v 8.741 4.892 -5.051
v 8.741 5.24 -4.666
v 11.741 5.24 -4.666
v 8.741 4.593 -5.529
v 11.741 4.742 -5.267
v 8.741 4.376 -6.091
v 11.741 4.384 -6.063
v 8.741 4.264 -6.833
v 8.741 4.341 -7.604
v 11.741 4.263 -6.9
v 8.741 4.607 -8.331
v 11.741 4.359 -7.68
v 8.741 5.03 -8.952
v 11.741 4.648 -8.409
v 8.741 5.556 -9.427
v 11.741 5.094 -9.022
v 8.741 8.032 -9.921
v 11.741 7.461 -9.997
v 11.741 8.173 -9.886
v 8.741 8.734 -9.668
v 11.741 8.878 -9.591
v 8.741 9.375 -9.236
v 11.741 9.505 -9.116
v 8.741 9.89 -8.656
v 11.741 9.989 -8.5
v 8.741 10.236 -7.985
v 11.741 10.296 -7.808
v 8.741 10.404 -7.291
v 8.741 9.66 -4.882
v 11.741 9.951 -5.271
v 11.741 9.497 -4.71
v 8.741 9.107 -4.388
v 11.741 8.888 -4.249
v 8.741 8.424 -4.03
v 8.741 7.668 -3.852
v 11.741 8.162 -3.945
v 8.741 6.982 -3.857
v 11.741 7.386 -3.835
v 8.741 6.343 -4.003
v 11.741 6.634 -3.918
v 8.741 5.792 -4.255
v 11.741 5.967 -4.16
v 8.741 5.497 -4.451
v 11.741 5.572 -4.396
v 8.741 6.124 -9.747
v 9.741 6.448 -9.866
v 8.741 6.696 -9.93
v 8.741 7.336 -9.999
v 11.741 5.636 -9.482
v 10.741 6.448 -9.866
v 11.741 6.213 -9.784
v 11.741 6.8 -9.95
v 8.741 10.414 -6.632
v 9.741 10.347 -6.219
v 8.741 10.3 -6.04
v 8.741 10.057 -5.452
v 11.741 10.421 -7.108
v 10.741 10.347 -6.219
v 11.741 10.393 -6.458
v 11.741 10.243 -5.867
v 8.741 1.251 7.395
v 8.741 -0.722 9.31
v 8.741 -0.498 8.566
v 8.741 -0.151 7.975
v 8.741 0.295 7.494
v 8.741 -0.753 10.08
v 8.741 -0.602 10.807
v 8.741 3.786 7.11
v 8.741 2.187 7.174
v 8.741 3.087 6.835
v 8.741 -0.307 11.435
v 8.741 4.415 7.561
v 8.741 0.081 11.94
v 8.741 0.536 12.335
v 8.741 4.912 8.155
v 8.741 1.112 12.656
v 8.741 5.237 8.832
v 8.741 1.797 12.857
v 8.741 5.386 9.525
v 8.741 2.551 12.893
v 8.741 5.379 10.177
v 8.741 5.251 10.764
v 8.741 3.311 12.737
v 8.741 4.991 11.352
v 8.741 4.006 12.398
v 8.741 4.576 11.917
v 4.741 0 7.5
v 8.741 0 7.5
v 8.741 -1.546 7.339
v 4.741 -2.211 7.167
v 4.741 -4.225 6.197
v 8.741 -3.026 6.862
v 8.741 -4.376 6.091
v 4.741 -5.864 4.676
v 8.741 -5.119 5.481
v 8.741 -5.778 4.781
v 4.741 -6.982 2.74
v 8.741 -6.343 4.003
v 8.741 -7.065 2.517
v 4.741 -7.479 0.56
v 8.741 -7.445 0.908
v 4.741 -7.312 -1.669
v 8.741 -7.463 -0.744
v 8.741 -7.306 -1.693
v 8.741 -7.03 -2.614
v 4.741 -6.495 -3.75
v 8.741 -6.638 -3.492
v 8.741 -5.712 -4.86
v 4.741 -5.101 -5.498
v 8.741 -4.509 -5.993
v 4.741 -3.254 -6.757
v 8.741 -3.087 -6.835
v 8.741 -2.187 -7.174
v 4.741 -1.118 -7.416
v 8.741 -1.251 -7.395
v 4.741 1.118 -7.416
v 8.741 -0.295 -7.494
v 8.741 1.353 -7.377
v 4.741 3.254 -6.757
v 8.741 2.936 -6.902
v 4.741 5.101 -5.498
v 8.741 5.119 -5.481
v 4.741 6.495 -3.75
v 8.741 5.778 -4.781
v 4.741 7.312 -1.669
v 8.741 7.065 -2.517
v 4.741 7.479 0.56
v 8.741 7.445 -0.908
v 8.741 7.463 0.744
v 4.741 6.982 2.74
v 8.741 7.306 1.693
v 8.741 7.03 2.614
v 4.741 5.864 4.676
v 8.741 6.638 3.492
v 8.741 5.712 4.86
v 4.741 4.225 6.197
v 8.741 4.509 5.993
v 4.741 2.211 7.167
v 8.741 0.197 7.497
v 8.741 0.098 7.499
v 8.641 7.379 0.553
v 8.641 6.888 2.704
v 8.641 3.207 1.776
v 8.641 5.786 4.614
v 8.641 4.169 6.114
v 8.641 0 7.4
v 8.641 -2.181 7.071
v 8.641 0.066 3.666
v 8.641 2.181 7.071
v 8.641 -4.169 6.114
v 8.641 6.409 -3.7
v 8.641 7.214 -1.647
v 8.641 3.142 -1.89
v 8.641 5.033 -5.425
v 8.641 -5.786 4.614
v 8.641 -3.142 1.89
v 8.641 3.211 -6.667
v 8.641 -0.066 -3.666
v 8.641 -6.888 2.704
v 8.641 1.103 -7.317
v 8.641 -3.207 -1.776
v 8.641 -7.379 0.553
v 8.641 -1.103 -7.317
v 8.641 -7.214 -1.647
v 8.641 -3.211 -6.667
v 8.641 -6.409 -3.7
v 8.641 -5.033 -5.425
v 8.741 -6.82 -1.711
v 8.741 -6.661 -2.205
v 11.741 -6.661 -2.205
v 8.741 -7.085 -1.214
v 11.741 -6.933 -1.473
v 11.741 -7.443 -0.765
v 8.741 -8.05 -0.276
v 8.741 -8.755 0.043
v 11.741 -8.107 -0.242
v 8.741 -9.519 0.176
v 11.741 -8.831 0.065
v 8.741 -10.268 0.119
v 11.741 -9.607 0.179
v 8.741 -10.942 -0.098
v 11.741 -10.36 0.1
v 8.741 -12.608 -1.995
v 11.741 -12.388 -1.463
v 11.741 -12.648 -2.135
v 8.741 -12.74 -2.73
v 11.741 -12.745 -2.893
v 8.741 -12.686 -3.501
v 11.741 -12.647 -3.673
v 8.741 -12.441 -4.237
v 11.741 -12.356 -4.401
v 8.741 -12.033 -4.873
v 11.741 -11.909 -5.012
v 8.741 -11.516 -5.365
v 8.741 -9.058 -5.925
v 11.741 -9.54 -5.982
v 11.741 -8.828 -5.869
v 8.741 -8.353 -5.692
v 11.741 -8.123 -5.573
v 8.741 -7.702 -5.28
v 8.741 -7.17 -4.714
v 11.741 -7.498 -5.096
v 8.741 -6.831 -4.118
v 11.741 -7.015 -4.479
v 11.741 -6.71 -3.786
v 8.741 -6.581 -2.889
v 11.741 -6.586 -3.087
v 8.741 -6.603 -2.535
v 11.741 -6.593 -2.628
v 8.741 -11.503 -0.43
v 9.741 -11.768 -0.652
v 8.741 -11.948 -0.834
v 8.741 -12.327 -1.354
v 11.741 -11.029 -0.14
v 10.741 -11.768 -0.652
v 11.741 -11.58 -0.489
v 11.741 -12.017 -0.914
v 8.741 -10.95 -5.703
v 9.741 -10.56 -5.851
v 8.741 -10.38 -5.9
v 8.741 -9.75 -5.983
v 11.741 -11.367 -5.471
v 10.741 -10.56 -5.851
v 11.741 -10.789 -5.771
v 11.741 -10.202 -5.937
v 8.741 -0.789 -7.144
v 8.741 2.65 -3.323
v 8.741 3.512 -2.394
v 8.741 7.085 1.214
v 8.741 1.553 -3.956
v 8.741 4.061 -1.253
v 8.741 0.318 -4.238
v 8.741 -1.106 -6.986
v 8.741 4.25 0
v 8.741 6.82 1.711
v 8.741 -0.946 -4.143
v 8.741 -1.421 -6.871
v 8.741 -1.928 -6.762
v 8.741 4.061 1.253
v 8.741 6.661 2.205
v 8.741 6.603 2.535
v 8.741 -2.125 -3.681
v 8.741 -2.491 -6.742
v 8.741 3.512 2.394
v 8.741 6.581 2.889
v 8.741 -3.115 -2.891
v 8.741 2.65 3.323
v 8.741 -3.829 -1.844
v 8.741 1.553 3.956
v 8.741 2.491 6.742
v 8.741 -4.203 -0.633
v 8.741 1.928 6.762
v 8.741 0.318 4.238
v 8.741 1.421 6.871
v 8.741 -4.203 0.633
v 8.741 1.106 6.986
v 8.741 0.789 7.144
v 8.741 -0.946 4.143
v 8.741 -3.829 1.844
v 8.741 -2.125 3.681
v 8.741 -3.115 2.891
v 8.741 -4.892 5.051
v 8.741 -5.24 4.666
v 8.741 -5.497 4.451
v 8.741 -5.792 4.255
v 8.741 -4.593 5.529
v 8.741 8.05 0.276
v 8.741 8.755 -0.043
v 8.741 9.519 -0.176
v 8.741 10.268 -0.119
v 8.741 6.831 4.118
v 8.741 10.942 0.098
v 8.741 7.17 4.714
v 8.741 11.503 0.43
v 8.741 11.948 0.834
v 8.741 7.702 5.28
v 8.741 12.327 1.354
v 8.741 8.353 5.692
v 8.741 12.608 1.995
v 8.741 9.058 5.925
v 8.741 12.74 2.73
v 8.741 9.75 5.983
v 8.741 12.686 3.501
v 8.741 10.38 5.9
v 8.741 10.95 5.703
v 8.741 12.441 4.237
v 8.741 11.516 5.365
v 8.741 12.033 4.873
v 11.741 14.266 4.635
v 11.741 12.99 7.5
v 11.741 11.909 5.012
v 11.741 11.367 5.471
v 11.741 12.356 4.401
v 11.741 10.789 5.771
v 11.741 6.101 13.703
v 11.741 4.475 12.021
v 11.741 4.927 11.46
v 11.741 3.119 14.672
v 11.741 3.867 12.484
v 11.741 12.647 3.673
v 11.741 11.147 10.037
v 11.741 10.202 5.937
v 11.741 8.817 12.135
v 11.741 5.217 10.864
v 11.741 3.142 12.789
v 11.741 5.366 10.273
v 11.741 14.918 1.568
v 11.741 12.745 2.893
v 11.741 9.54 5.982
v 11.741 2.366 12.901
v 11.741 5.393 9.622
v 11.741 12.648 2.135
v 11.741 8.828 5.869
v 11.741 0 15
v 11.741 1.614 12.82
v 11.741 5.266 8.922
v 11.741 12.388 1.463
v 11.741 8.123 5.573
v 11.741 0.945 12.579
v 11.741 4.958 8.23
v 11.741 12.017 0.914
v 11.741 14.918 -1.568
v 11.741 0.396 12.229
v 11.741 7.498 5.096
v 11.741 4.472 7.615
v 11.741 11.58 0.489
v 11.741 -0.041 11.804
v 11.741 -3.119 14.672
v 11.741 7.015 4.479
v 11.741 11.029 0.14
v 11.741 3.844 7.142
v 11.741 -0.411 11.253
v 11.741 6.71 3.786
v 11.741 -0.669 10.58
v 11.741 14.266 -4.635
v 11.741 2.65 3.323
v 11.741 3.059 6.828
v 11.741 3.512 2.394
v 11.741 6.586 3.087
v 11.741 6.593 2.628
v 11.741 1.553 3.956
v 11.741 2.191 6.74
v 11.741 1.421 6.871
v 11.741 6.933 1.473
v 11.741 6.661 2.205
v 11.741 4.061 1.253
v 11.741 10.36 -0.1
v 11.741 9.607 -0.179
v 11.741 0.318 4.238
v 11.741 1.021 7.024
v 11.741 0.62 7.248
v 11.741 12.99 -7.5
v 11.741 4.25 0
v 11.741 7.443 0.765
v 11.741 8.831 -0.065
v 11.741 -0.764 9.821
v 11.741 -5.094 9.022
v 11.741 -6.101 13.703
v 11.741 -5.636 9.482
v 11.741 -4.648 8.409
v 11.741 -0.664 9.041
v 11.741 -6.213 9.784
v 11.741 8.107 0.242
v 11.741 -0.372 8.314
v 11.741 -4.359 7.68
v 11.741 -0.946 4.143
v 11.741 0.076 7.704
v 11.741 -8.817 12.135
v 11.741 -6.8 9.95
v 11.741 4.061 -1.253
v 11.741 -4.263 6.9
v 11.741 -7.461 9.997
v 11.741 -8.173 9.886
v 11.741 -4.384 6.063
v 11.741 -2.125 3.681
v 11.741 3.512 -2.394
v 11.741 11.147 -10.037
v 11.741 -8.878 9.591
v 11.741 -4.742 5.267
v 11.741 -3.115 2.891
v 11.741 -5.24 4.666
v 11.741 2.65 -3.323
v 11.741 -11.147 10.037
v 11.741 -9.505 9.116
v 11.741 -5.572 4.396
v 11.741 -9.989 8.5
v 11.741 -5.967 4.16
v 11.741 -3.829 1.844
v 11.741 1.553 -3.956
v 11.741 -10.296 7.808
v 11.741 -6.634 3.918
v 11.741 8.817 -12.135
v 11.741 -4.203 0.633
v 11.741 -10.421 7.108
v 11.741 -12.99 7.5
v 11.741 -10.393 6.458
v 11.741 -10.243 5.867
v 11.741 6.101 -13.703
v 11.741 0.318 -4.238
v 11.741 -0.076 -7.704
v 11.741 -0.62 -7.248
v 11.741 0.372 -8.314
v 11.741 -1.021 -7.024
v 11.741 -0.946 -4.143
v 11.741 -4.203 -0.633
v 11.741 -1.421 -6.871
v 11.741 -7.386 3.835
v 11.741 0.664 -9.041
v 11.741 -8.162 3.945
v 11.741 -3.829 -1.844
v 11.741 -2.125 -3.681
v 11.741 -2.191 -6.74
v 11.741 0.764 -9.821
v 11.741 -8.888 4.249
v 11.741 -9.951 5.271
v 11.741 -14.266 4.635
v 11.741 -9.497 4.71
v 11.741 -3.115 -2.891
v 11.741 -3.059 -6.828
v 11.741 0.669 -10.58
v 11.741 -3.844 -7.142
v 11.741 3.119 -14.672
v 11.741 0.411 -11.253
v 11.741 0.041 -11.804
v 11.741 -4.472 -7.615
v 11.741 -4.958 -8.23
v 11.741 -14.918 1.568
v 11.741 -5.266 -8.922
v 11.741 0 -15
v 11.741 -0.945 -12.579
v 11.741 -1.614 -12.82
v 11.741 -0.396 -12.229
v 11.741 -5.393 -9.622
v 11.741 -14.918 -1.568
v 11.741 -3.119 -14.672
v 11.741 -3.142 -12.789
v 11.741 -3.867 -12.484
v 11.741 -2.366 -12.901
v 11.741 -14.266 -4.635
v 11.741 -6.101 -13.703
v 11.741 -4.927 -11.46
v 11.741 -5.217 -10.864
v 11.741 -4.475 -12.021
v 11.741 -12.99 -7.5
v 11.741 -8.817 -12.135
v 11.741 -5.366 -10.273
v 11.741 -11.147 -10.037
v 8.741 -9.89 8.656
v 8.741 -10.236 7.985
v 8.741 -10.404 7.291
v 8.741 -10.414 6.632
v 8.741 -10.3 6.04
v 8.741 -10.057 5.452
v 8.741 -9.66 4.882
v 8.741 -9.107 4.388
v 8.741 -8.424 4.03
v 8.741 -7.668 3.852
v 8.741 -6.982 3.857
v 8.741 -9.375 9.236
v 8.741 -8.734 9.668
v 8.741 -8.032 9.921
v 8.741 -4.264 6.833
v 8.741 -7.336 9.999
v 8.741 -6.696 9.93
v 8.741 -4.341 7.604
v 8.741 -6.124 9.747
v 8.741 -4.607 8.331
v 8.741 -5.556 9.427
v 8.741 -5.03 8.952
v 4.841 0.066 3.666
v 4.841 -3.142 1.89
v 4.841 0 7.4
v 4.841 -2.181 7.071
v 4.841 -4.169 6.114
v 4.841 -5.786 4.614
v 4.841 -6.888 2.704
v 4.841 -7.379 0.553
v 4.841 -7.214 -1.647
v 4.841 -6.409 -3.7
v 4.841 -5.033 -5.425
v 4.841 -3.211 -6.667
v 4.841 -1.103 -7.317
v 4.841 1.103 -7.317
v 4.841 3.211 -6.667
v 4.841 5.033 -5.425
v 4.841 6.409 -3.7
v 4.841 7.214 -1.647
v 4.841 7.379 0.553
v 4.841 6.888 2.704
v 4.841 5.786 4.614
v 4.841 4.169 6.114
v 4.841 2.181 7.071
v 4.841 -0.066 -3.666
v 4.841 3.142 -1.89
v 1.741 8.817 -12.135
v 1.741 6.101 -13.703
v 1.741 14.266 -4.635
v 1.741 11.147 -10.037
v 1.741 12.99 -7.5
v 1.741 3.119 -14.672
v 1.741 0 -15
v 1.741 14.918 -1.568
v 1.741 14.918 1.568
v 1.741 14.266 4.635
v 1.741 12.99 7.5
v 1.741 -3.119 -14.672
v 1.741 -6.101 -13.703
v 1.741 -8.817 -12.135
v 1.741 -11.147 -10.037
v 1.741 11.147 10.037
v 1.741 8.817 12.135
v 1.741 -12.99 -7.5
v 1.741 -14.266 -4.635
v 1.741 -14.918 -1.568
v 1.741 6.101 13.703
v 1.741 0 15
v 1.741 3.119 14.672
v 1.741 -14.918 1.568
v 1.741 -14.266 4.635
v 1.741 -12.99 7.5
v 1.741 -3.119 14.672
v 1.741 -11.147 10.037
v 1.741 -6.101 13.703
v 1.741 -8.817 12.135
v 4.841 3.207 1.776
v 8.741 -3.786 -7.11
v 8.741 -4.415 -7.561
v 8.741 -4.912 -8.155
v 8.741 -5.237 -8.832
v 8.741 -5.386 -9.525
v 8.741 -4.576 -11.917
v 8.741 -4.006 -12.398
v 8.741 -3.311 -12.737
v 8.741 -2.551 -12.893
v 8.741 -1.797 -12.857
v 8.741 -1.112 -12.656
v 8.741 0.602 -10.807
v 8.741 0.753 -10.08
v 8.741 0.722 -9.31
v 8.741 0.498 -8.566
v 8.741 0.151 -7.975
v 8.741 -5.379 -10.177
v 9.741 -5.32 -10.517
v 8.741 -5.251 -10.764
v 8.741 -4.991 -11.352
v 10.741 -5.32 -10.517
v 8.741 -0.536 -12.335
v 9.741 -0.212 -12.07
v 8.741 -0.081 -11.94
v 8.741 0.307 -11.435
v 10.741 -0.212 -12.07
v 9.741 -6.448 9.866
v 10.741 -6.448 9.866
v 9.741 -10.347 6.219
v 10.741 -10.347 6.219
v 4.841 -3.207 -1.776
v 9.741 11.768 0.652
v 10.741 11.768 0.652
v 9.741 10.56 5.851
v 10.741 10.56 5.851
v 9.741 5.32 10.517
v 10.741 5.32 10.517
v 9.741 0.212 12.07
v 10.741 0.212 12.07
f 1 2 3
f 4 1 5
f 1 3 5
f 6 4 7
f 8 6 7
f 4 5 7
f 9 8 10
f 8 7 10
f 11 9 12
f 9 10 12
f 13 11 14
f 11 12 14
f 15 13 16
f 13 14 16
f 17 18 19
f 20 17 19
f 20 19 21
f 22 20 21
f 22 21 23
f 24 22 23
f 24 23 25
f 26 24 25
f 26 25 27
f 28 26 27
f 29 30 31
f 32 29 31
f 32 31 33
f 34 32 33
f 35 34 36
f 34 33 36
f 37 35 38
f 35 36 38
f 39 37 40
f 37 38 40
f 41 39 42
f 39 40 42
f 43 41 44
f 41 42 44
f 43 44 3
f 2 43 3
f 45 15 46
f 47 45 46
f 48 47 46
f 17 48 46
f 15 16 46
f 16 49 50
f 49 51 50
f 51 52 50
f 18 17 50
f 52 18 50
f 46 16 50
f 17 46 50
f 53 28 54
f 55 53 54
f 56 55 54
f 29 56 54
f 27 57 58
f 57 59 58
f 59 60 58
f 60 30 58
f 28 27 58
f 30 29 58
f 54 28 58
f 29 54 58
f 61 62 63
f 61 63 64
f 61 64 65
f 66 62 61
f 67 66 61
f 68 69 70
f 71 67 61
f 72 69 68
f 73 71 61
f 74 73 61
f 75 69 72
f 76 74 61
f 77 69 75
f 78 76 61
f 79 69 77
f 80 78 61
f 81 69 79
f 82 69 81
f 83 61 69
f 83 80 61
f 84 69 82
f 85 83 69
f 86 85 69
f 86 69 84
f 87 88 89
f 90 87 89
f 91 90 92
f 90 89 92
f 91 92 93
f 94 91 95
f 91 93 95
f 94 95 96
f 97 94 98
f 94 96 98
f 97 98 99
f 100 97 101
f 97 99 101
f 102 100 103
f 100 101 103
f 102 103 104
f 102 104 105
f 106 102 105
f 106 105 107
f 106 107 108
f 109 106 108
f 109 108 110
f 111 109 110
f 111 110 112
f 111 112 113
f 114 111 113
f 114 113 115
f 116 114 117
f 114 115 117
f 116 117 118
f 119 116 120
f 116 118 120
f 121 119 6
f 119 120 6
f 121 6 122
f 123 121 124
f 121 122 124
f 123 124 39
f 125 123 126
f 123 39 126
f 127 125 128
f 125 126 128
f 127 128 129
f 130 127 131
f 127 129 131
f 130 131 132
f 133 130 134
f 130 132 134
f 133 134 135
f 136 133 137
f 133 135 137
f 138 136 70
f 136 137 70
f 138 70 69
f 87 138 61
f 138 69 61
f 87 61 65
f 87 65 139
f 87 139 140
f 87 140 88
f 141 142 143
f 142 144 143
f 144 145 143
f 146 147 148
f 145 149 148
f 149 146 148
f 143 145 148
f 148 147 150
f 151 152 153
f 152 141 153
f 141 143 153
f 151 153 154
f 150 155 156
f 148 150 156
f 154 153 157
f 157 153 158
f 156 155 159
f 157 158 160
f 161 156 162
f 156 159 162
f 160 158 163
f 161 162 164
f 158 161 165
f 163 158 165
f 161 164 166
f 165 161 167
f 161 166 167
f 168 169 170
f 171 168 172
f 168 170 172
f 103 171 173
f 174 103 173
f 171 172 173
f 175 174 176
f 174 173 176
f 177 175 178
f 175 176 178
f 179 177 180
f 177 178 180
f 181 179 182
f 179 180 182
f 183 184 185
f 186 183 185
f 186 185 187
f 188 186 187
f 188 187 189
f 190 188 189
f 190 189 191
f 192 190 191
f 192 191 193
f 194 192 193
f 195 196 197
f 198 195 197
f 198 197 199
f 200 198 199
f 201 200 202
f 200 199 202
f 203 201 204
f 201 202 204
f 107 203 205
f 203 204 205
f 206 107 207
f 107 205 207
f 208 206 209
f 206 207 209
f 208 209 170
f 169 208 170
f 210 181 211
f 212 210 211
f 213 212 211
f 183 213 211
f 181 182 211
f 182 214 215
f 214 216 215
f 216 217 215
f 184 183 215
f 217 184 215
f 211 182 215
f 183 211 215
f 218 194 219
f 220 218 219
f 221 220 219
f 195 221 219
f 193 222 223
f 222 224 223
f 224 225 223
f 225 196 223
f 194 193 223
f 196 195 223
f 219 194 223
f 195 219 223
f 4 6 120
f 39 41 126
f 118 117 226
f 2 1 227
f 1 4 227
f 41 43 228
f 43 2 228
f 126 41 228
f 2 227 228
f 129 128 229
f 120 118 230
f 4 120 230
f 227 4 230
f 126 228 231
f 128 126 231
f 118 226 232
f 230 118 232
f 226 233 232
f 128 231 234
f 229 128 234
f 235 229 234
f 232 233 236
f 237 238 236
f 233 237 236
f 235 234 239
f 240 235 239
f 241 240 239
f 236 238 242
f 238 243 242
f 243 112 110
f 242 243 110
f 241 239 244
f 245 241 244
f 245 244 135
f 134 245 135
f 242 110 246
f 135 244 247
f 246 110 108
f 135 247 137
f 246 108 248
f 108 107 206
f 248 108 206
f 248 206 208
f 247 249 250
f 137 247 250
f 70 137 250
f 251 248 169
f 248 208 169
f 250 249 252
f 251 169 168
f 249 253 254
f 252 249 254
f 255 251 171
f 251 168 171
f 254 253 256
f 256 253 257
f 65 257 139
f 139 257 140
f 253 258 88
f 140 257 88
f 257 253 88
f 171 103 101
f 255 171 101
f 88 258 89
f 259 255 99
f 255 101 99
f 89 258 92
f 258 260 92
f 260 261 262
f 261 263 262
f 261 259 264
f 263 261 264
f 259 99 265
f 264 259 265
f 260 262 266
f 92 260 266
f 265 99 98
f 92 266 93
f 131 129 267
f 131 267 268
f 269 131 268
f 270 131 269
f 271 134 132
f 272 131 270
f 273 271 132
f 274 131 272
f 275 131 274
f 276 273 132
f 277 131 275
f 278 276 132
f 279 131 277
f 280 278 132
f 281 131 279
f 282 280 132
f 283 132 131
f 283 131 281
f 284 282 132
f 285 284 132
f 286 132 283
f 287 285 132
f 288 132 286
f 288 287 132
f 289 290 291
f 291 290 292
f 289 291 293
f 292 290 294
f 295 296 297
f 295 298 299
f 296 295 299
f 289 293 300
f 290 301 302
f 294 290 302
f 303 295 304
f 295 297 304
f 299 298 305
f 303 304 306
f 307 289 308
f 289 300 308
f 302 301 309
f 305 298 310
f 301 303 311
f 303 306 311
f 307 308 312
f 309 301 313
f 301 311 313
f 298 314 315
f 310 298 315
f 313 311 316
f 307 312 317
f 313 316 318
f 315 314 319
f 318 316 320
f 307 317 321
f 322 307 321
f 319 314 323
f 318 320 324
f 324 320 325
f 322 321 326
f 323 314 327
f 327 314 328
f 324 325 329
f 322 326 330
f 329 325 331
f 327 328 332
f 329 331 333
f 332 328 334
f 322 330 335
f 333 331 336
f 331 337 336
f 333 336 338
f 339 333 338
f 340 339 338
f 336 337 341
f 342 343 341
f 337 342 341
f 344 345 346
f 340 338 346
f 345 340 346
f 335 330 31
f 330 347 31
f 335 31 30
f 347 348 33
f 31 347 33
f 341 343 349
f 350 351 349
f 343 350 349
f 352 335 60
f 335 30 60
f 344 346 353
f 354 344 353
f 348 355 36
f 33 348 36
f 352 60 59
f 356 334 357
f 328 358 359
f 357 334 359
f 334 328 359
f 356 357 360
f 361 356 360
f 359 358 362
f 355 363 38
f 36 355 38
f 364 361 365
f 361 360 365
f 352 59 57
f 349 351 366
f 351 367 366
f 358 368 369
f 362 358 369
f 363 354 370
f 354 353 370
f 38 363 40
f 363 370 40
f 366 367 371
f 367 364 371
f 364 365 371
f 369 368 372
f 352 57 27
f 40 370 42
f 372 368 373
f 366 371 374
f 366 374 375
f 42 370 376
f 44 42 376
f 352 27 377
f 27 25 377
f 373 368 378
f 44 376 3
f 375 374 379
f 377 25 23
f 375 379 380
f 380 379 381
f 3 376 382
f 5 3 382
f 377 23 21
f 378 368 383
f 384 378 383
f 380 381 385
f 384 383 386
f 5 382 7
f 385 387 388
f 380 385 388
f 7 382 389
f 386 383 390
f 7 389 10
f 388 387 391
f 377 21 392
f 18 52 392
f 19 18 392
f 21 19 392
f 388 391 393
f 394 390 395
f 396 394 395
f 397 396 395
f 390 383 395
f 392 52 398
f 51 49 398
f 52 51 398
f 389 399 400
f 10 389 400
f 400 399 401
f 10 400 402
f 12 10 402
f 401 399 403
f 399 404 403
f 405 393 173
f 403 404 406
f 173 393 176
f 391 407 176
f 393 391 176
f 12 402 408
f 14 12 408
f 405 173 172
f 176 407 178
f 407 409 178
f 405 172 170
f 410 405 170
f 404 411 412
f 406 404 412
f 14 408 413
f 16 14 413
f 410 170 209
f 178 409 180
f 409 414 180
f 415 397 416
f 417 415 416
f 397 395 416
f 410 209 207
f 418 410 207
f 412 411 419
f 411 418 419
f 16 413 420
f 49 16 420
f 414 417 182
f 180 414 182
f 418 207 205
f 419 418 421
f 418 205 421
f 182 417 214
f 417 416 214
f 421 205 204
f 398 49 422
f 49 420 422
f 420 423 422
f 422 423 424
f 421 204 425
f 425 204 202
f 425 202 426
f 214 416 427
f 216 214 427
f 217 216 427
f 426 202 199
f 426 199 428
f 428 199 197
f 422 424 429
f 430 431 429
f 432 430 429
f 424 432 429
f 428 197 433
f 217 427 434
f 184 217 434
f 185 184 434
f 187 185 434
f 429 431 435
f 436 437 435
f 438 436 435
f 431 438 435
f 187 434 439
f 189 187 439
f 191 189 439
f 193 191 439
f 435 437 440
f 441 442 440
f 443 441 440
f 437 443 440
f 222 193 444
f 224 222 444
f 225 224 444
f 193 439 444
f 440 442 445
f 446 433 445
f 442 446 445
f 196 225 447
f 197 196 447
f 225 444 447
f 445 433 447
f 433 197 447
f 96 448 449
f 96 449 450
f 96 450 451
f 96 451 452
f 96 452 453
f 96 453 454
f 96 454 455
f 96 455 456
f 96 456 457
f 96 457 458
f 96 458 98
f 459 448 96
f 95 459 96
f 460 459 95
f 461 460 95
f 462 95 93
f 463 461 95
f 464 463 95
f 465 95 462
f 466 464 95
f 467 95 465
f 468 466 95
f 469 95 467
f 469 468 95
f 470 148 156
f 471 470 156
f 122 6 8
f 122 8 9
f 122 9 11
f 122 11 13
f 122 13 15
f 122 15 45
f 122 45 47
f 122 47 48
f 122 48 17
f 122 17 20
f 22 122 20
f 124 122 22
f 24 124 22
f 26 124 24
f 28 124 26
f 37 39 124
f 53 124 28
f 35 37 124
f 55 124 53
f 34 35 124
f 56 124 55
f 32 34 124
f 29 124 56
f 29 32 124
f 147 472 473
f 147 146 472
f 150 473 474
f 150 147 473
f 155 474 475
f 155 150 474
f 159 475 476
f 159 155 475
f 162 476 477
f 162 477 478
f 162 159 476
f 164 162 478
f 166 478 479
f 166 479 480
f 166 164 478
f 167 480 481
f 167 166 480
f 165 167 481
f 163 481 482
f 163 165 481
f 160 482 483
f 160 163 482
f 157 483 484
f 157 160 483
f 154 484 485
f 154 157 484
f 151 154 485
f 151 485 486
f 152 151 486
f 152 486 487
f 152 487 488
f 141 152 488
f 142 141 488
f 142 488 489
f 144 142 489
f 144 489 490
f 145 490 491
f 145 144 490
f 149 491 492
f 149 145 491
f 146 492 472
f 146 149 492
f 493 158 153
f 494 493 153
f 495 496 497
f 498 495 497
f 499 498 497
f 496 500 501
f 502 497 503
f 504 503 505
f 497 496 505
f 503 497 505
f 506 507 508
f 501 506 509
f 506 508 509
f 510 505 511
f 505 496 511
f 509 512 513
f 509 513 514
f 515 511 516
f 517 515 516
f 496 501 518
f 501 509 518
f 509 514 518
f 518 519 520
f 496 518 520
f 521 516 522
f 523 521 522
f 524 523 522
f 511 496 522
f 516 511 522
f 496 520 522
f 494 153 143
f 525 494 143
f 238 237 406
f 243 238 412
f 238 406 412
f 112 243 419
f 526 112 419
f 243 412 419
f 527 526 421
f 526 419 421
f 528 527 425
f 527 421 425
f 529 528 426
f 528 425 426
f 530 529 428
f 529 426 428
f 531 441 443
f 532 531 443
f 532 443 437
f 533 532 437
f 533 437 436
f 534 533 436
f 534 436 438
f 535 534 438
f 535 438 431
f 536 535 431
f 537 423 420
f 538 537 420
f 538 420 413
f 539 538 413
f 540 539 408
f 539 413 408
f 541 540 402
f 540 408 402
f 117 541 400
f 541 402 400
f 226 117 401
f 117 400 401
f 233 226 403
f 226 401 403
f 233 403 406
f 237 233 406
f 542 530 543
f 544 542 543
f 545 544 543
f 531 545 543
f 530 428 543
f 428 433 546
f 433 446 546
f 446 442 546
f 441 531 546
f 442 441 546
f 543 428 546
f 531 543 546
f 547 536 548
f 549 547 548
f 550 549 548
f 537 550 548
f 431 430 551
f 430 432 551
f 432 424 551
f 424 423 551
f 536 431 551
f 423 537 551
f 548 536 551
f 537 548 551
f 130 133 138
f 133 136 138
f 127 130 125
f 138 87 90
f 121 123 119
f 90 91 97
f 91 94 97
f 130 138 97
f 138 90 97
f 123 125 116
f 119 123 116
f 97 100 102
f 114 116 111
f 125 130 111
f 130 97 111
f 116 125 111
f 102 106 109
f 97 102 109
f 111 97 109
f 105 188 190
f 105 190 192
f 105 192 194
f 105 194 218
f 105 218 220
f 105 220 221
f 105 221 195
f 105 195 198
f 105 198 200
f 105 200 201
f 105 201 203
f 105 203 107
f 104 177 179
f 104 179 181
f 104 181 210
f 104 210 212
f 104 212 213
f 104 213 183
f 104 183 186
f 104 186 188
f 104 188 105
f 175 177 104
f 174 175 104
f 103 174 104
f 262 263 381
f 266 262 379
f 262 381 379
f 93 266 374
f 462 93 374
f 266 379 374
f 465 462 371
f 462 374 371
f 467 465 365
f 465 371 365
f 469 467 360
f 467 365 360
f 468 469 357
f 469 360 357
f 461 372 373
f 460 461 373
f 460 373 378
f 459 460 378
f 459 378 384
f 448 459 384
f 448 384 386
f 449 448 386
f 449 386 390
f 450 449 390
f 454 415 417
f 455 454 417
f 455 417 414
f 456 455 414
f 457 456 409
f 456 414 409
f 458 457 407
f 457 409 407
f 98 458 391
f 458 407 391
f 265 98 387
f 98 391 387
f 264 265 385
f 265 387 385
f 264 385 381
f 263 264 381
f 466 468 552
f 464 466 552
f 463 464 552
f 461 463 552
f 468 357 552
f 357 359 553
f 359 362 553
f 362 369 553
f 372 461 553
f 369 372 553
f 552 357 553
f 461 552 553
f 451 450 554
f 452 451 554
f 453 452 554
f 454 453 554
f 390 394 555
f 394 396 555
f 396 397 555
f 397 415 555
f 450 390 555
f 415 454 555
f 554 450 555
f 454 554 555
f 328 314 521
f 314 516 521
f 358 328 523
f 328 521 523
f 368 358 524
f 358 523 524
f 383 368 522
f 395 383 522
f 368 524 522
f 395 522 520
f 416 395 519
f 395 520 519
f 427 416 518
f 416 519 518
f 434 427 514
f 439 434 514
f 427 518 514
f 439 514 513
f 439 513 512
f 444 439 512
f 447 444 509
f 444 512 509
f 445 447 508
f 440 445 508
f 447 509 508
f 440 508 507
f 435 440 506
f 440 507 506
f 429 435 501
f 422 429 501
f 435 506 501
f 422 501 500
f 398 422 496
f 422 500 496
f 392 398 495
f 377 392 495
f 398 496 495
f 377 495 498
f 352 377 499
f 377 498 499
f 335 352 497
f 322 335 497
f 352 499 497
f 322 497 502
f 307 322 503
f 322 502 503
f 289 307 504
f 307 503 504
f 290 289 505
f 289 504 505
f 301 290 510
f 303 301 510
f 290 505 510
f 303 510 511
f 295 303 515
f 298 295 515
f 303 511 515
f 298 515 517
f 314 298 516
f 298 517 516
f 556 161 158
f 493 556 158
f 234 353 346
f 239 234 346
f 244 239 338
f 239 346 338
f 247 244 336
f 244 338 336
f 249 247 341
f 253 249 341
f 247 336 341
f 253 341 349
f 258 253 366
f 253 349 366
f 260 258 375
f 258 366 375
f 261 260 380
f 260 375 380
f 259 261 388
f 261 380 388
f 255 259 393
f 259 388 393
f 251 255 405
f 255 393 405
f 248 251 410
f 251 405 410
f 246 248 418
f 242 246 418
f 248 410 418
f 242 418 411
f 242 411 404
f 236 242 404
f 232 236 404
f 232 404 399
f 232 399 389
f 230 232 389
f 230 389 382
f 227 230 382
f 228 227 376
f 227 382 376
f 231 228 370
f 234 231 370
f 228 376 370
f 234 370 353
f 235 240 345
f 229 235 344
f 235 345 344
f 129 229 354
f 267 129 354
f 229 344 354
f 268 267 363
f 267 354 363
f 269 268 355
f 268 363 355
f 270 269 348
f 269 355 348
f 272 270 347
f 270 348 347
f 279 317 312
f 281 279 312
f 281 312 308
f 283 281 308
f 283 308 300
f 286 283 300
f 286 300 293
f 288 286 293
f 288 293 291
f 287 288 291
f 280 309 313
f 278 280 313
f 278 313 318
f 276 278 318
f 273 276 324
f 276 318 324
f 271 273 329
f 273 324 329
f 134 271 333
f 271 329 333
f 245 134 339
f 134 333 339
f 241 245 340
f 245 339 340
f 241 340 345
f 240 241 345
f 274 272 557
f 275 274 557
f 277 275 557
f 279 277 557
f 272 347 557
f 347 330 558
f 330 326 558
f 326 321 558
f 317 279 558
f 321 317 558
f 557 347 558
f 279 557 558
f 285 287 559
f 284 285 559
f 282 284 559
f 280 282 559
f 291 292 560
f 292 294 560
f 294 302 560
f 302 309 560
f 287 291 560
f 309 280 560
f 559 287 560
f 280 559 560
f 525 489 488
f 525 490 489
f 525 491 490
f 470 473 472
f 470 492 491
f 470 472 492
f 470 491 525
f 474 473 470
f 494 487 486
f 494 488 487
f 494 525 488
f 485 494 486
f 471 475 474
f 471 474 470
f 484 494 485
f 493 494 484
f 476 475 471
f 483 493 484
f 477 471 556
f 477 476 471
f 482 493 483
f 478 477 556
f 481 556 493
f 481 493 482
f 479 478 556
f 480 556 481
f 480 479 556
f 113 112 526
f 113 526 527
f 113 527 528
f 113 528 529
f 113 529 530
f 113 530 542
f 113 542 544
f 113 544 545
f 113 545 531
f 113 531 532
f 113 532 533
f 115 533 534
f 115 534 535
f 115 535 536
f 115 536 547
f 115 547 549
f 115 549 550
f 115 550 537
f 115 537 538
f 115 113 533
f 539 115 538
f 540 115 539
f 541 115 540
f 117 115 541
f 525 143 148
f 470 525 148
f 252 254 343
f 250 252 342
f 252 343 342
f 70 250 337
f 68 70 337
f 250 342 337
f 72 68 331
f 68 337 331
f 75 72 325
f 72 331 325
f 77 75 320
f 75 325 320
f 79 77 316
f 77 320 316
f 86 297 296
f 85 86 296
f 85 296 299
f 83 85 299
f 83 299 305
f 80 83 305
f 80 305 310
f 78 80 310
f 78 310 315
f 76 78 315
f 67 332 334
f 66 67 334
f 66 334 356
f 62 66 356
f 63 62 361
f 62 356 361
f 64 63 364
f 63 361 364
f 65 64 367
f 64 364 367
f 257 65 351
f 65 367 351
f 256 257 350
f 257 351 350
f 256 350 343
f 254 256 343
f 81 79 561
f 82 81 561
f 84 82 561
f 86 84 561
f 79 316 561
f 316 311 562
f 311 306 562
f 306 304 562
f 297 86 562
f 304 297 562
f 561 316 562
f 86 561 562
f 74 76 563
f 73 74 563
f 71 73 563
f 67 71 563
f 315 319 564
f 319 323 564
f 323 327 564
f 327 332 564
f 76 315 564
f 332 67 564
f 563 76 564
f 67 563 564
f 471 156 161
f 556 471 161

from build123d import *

# Parameters (mm, degrees)
F0_W     = 3.8
F0_H     = 7.4
F2_R     = 4.25
F3_DEPTH = 3
F5_DEPTH = 3.8
F8_DEPTH = 3


with BuildPart() as f1:
    # F0 (on Front) → F1 (revolve)
    with BuildSketch(Plane.XZ):
        Polygon((1.7411876178, 15), (1.7411876178, 0), (4.7411876178, 0), (4.7411876178, 7.5), (8.7411876178, 7.5), (8.7411876178, 0), (11.7411876178, 0), (11.7411876178, 15), align=None)
    revolve(axis=Axis((13.5514412541, 0, 0), (1, 0, 0)))

    # F2 (on face) → F3 (cut)
    with BuildSketch(Plane.YZ.offset(11.7411876178)):
        Circle(F2_R)
    extrude(amount=-F3_DEPTH, mode=Mode.SUBTRACT)

    # F7 (on face) → F8 (cut)
    with BuildSketch(Plane.YZ.offset(11.7411876178)):
        with BuildLine():
            add(Edge.make_bspline(
                [(-5.2398015868, 4.6661241851), (-1.3411760526, 8.3125768665), (-6.4484094755, 9.8656592782), (-11.5556428984, 11.41874169), (-10.3470350097, 6.2192065969), (-9.138427121, 1.0196715037), (-5.2398015868, 4.6661241851)],
                knots=[0, 0, 0, 2.0943951024, 2.0943951024, 4.1887902048, 4.1887902048, 6.2831853072, 6.2831853072, 6.2831853072], degree=2, weights=[1, 0.5, 1, 0.5, 1, 0.5, 1]))
        make_face()
        with BuildLine():
            add(Edge.make_bspline(
                [(1.4210812881, 6.8708633775), (6.528314711, 5.3177809657), (5.3197068223, 10.5173160589), (4.1110989336, 15.7168511521), (0.2124733994, 12.0703984707), (-3.6861521348, 8.4239457893), (1.4210812881, 6.8708633775)],
                knots=[0, 0, 0, 2.0943951024, 2.0943951024, 4.1887902048, 4.1887902048, 6.2831853072, 6.2831853072, 6.2831853072], degree=2, weights=[1, 0.5, 1, 0.5, 1, 0.5, 1]))
        make_face()
        with BuildLine():
            add(Edge.make_bspline(
                [(6.6608828749, 2.2047391924), (7.8694907636, -2.9947959007), (11.7681162978, 0.6516567806), (15.666741832, 4.298109462), (10.5595084091, 5.8511918738), (5.4522749862, 7.4042742856), (6.6608828749, 2.2047391924)],
                knots=[0, 0, 0, 2.0943951024, 2.0943951024, 4.1887902048, 4.1887902048, 6.2831853072, 6.2831853072, 6.2831853072], degree=2, weights=[1, 0.5, 1, 0.5, 1, 0.5, 1]))
        make_face()
        with BuildLine():
            add(Edge.make_bspline(
                [(5.2398015868, -4.6661241851), (1.3411760526, -8.3125768665), (6.4484094755, -9.8656592782), (11.5556428984, -11.41874169), (10.3470350097, -6.2192065969), (9.138427121, -1.0196715037), (5.2398015868, -4.6661241851)],
                knots=[0, 0, 0, 2.0943951024, 2.0943951024, 4.1887902048, 4.1887902048, 6.2831853072, 6.2831853072, 6.2831853072], degree=2, weights=[1, 0.5, 1, 0.5, 1, 0.5, 1]))
        make_face()
        with BuildLine():
            add(Edge.make_bspline(
                [(-1.4210812881, -6.8708633775), (-6.528314711, -5.3177809657), (-5.3197068223, -10.5173160589), (-4.1110989336, -15.7168511521), (-0.2124733994, -12.0703984707), (3.6861521348, -8.4239457893), (-1.4210812881, -6.8708633775)],
                knots=[0, 0, 0, 2.0943951024, 2.0943951024, 4.1887902048, 4.1887902048, 6.2831853072, 6.2831853072, 6.2831853072], degree=2, weights=[1, 0.5, 1, 0.5, 1, 0.5, 1]))
        make_face()
        with BuildLine():
            add(Edge.make_bspline(
                [(-6.6608828749, -2.2047391924), (-7.8694907636, 2.9947959007), (-11.7681162978, -0.6516567806), (-15.666741832, -4.298109462), (-10.5595084091, -5.8511918738), (-5.4522749862, -7.4042742856), (-6.6608828749, -2.2047391924)],
                knots=[0, 0, 0, 2.0943951024, 2.0943951024, 4.1887902048, 4.1887902048, 6.2831853072, 6.2831853072, 6.2831853072], degree=2, weights=[1, 0.5, 1, 0.5, 1, 0.5, 1]))
        make_face()
    extrude(amount=-F8_DEPTH, mode=Mode.SUBTRACT)


with BuildPart() as f1b:
    # F0 (on Front) → F1, piece 2 (revolve)
    with BuildSketch(Plane.XZ):
        with Locations((6.7411876178, 3.7)):
            Rectangle(F0_W, F0_H)
    revolve(axis=Axis((13.5514412541, 0, 0), (1, 0, 0)))

    # F4 (on face) → F5 (cut)
    with BuildSketch(Plane.YZ.offset(8.6411876178)):
        Polygon((-3.2073198489, -1.7759315077), (-0.0656581235, -3.6655862211), (3.1416617255, -1.8896547134), (3.2073198489, 1.7759315077), (0.0656581235, 3.6655862211), (-3.1416617255, 1.8896547134), align=None)
    extrude(amount=-F5_DEPTH, mode=Mode.SUBTRACT)


solid = Compound([f1.part, f1b.part])
